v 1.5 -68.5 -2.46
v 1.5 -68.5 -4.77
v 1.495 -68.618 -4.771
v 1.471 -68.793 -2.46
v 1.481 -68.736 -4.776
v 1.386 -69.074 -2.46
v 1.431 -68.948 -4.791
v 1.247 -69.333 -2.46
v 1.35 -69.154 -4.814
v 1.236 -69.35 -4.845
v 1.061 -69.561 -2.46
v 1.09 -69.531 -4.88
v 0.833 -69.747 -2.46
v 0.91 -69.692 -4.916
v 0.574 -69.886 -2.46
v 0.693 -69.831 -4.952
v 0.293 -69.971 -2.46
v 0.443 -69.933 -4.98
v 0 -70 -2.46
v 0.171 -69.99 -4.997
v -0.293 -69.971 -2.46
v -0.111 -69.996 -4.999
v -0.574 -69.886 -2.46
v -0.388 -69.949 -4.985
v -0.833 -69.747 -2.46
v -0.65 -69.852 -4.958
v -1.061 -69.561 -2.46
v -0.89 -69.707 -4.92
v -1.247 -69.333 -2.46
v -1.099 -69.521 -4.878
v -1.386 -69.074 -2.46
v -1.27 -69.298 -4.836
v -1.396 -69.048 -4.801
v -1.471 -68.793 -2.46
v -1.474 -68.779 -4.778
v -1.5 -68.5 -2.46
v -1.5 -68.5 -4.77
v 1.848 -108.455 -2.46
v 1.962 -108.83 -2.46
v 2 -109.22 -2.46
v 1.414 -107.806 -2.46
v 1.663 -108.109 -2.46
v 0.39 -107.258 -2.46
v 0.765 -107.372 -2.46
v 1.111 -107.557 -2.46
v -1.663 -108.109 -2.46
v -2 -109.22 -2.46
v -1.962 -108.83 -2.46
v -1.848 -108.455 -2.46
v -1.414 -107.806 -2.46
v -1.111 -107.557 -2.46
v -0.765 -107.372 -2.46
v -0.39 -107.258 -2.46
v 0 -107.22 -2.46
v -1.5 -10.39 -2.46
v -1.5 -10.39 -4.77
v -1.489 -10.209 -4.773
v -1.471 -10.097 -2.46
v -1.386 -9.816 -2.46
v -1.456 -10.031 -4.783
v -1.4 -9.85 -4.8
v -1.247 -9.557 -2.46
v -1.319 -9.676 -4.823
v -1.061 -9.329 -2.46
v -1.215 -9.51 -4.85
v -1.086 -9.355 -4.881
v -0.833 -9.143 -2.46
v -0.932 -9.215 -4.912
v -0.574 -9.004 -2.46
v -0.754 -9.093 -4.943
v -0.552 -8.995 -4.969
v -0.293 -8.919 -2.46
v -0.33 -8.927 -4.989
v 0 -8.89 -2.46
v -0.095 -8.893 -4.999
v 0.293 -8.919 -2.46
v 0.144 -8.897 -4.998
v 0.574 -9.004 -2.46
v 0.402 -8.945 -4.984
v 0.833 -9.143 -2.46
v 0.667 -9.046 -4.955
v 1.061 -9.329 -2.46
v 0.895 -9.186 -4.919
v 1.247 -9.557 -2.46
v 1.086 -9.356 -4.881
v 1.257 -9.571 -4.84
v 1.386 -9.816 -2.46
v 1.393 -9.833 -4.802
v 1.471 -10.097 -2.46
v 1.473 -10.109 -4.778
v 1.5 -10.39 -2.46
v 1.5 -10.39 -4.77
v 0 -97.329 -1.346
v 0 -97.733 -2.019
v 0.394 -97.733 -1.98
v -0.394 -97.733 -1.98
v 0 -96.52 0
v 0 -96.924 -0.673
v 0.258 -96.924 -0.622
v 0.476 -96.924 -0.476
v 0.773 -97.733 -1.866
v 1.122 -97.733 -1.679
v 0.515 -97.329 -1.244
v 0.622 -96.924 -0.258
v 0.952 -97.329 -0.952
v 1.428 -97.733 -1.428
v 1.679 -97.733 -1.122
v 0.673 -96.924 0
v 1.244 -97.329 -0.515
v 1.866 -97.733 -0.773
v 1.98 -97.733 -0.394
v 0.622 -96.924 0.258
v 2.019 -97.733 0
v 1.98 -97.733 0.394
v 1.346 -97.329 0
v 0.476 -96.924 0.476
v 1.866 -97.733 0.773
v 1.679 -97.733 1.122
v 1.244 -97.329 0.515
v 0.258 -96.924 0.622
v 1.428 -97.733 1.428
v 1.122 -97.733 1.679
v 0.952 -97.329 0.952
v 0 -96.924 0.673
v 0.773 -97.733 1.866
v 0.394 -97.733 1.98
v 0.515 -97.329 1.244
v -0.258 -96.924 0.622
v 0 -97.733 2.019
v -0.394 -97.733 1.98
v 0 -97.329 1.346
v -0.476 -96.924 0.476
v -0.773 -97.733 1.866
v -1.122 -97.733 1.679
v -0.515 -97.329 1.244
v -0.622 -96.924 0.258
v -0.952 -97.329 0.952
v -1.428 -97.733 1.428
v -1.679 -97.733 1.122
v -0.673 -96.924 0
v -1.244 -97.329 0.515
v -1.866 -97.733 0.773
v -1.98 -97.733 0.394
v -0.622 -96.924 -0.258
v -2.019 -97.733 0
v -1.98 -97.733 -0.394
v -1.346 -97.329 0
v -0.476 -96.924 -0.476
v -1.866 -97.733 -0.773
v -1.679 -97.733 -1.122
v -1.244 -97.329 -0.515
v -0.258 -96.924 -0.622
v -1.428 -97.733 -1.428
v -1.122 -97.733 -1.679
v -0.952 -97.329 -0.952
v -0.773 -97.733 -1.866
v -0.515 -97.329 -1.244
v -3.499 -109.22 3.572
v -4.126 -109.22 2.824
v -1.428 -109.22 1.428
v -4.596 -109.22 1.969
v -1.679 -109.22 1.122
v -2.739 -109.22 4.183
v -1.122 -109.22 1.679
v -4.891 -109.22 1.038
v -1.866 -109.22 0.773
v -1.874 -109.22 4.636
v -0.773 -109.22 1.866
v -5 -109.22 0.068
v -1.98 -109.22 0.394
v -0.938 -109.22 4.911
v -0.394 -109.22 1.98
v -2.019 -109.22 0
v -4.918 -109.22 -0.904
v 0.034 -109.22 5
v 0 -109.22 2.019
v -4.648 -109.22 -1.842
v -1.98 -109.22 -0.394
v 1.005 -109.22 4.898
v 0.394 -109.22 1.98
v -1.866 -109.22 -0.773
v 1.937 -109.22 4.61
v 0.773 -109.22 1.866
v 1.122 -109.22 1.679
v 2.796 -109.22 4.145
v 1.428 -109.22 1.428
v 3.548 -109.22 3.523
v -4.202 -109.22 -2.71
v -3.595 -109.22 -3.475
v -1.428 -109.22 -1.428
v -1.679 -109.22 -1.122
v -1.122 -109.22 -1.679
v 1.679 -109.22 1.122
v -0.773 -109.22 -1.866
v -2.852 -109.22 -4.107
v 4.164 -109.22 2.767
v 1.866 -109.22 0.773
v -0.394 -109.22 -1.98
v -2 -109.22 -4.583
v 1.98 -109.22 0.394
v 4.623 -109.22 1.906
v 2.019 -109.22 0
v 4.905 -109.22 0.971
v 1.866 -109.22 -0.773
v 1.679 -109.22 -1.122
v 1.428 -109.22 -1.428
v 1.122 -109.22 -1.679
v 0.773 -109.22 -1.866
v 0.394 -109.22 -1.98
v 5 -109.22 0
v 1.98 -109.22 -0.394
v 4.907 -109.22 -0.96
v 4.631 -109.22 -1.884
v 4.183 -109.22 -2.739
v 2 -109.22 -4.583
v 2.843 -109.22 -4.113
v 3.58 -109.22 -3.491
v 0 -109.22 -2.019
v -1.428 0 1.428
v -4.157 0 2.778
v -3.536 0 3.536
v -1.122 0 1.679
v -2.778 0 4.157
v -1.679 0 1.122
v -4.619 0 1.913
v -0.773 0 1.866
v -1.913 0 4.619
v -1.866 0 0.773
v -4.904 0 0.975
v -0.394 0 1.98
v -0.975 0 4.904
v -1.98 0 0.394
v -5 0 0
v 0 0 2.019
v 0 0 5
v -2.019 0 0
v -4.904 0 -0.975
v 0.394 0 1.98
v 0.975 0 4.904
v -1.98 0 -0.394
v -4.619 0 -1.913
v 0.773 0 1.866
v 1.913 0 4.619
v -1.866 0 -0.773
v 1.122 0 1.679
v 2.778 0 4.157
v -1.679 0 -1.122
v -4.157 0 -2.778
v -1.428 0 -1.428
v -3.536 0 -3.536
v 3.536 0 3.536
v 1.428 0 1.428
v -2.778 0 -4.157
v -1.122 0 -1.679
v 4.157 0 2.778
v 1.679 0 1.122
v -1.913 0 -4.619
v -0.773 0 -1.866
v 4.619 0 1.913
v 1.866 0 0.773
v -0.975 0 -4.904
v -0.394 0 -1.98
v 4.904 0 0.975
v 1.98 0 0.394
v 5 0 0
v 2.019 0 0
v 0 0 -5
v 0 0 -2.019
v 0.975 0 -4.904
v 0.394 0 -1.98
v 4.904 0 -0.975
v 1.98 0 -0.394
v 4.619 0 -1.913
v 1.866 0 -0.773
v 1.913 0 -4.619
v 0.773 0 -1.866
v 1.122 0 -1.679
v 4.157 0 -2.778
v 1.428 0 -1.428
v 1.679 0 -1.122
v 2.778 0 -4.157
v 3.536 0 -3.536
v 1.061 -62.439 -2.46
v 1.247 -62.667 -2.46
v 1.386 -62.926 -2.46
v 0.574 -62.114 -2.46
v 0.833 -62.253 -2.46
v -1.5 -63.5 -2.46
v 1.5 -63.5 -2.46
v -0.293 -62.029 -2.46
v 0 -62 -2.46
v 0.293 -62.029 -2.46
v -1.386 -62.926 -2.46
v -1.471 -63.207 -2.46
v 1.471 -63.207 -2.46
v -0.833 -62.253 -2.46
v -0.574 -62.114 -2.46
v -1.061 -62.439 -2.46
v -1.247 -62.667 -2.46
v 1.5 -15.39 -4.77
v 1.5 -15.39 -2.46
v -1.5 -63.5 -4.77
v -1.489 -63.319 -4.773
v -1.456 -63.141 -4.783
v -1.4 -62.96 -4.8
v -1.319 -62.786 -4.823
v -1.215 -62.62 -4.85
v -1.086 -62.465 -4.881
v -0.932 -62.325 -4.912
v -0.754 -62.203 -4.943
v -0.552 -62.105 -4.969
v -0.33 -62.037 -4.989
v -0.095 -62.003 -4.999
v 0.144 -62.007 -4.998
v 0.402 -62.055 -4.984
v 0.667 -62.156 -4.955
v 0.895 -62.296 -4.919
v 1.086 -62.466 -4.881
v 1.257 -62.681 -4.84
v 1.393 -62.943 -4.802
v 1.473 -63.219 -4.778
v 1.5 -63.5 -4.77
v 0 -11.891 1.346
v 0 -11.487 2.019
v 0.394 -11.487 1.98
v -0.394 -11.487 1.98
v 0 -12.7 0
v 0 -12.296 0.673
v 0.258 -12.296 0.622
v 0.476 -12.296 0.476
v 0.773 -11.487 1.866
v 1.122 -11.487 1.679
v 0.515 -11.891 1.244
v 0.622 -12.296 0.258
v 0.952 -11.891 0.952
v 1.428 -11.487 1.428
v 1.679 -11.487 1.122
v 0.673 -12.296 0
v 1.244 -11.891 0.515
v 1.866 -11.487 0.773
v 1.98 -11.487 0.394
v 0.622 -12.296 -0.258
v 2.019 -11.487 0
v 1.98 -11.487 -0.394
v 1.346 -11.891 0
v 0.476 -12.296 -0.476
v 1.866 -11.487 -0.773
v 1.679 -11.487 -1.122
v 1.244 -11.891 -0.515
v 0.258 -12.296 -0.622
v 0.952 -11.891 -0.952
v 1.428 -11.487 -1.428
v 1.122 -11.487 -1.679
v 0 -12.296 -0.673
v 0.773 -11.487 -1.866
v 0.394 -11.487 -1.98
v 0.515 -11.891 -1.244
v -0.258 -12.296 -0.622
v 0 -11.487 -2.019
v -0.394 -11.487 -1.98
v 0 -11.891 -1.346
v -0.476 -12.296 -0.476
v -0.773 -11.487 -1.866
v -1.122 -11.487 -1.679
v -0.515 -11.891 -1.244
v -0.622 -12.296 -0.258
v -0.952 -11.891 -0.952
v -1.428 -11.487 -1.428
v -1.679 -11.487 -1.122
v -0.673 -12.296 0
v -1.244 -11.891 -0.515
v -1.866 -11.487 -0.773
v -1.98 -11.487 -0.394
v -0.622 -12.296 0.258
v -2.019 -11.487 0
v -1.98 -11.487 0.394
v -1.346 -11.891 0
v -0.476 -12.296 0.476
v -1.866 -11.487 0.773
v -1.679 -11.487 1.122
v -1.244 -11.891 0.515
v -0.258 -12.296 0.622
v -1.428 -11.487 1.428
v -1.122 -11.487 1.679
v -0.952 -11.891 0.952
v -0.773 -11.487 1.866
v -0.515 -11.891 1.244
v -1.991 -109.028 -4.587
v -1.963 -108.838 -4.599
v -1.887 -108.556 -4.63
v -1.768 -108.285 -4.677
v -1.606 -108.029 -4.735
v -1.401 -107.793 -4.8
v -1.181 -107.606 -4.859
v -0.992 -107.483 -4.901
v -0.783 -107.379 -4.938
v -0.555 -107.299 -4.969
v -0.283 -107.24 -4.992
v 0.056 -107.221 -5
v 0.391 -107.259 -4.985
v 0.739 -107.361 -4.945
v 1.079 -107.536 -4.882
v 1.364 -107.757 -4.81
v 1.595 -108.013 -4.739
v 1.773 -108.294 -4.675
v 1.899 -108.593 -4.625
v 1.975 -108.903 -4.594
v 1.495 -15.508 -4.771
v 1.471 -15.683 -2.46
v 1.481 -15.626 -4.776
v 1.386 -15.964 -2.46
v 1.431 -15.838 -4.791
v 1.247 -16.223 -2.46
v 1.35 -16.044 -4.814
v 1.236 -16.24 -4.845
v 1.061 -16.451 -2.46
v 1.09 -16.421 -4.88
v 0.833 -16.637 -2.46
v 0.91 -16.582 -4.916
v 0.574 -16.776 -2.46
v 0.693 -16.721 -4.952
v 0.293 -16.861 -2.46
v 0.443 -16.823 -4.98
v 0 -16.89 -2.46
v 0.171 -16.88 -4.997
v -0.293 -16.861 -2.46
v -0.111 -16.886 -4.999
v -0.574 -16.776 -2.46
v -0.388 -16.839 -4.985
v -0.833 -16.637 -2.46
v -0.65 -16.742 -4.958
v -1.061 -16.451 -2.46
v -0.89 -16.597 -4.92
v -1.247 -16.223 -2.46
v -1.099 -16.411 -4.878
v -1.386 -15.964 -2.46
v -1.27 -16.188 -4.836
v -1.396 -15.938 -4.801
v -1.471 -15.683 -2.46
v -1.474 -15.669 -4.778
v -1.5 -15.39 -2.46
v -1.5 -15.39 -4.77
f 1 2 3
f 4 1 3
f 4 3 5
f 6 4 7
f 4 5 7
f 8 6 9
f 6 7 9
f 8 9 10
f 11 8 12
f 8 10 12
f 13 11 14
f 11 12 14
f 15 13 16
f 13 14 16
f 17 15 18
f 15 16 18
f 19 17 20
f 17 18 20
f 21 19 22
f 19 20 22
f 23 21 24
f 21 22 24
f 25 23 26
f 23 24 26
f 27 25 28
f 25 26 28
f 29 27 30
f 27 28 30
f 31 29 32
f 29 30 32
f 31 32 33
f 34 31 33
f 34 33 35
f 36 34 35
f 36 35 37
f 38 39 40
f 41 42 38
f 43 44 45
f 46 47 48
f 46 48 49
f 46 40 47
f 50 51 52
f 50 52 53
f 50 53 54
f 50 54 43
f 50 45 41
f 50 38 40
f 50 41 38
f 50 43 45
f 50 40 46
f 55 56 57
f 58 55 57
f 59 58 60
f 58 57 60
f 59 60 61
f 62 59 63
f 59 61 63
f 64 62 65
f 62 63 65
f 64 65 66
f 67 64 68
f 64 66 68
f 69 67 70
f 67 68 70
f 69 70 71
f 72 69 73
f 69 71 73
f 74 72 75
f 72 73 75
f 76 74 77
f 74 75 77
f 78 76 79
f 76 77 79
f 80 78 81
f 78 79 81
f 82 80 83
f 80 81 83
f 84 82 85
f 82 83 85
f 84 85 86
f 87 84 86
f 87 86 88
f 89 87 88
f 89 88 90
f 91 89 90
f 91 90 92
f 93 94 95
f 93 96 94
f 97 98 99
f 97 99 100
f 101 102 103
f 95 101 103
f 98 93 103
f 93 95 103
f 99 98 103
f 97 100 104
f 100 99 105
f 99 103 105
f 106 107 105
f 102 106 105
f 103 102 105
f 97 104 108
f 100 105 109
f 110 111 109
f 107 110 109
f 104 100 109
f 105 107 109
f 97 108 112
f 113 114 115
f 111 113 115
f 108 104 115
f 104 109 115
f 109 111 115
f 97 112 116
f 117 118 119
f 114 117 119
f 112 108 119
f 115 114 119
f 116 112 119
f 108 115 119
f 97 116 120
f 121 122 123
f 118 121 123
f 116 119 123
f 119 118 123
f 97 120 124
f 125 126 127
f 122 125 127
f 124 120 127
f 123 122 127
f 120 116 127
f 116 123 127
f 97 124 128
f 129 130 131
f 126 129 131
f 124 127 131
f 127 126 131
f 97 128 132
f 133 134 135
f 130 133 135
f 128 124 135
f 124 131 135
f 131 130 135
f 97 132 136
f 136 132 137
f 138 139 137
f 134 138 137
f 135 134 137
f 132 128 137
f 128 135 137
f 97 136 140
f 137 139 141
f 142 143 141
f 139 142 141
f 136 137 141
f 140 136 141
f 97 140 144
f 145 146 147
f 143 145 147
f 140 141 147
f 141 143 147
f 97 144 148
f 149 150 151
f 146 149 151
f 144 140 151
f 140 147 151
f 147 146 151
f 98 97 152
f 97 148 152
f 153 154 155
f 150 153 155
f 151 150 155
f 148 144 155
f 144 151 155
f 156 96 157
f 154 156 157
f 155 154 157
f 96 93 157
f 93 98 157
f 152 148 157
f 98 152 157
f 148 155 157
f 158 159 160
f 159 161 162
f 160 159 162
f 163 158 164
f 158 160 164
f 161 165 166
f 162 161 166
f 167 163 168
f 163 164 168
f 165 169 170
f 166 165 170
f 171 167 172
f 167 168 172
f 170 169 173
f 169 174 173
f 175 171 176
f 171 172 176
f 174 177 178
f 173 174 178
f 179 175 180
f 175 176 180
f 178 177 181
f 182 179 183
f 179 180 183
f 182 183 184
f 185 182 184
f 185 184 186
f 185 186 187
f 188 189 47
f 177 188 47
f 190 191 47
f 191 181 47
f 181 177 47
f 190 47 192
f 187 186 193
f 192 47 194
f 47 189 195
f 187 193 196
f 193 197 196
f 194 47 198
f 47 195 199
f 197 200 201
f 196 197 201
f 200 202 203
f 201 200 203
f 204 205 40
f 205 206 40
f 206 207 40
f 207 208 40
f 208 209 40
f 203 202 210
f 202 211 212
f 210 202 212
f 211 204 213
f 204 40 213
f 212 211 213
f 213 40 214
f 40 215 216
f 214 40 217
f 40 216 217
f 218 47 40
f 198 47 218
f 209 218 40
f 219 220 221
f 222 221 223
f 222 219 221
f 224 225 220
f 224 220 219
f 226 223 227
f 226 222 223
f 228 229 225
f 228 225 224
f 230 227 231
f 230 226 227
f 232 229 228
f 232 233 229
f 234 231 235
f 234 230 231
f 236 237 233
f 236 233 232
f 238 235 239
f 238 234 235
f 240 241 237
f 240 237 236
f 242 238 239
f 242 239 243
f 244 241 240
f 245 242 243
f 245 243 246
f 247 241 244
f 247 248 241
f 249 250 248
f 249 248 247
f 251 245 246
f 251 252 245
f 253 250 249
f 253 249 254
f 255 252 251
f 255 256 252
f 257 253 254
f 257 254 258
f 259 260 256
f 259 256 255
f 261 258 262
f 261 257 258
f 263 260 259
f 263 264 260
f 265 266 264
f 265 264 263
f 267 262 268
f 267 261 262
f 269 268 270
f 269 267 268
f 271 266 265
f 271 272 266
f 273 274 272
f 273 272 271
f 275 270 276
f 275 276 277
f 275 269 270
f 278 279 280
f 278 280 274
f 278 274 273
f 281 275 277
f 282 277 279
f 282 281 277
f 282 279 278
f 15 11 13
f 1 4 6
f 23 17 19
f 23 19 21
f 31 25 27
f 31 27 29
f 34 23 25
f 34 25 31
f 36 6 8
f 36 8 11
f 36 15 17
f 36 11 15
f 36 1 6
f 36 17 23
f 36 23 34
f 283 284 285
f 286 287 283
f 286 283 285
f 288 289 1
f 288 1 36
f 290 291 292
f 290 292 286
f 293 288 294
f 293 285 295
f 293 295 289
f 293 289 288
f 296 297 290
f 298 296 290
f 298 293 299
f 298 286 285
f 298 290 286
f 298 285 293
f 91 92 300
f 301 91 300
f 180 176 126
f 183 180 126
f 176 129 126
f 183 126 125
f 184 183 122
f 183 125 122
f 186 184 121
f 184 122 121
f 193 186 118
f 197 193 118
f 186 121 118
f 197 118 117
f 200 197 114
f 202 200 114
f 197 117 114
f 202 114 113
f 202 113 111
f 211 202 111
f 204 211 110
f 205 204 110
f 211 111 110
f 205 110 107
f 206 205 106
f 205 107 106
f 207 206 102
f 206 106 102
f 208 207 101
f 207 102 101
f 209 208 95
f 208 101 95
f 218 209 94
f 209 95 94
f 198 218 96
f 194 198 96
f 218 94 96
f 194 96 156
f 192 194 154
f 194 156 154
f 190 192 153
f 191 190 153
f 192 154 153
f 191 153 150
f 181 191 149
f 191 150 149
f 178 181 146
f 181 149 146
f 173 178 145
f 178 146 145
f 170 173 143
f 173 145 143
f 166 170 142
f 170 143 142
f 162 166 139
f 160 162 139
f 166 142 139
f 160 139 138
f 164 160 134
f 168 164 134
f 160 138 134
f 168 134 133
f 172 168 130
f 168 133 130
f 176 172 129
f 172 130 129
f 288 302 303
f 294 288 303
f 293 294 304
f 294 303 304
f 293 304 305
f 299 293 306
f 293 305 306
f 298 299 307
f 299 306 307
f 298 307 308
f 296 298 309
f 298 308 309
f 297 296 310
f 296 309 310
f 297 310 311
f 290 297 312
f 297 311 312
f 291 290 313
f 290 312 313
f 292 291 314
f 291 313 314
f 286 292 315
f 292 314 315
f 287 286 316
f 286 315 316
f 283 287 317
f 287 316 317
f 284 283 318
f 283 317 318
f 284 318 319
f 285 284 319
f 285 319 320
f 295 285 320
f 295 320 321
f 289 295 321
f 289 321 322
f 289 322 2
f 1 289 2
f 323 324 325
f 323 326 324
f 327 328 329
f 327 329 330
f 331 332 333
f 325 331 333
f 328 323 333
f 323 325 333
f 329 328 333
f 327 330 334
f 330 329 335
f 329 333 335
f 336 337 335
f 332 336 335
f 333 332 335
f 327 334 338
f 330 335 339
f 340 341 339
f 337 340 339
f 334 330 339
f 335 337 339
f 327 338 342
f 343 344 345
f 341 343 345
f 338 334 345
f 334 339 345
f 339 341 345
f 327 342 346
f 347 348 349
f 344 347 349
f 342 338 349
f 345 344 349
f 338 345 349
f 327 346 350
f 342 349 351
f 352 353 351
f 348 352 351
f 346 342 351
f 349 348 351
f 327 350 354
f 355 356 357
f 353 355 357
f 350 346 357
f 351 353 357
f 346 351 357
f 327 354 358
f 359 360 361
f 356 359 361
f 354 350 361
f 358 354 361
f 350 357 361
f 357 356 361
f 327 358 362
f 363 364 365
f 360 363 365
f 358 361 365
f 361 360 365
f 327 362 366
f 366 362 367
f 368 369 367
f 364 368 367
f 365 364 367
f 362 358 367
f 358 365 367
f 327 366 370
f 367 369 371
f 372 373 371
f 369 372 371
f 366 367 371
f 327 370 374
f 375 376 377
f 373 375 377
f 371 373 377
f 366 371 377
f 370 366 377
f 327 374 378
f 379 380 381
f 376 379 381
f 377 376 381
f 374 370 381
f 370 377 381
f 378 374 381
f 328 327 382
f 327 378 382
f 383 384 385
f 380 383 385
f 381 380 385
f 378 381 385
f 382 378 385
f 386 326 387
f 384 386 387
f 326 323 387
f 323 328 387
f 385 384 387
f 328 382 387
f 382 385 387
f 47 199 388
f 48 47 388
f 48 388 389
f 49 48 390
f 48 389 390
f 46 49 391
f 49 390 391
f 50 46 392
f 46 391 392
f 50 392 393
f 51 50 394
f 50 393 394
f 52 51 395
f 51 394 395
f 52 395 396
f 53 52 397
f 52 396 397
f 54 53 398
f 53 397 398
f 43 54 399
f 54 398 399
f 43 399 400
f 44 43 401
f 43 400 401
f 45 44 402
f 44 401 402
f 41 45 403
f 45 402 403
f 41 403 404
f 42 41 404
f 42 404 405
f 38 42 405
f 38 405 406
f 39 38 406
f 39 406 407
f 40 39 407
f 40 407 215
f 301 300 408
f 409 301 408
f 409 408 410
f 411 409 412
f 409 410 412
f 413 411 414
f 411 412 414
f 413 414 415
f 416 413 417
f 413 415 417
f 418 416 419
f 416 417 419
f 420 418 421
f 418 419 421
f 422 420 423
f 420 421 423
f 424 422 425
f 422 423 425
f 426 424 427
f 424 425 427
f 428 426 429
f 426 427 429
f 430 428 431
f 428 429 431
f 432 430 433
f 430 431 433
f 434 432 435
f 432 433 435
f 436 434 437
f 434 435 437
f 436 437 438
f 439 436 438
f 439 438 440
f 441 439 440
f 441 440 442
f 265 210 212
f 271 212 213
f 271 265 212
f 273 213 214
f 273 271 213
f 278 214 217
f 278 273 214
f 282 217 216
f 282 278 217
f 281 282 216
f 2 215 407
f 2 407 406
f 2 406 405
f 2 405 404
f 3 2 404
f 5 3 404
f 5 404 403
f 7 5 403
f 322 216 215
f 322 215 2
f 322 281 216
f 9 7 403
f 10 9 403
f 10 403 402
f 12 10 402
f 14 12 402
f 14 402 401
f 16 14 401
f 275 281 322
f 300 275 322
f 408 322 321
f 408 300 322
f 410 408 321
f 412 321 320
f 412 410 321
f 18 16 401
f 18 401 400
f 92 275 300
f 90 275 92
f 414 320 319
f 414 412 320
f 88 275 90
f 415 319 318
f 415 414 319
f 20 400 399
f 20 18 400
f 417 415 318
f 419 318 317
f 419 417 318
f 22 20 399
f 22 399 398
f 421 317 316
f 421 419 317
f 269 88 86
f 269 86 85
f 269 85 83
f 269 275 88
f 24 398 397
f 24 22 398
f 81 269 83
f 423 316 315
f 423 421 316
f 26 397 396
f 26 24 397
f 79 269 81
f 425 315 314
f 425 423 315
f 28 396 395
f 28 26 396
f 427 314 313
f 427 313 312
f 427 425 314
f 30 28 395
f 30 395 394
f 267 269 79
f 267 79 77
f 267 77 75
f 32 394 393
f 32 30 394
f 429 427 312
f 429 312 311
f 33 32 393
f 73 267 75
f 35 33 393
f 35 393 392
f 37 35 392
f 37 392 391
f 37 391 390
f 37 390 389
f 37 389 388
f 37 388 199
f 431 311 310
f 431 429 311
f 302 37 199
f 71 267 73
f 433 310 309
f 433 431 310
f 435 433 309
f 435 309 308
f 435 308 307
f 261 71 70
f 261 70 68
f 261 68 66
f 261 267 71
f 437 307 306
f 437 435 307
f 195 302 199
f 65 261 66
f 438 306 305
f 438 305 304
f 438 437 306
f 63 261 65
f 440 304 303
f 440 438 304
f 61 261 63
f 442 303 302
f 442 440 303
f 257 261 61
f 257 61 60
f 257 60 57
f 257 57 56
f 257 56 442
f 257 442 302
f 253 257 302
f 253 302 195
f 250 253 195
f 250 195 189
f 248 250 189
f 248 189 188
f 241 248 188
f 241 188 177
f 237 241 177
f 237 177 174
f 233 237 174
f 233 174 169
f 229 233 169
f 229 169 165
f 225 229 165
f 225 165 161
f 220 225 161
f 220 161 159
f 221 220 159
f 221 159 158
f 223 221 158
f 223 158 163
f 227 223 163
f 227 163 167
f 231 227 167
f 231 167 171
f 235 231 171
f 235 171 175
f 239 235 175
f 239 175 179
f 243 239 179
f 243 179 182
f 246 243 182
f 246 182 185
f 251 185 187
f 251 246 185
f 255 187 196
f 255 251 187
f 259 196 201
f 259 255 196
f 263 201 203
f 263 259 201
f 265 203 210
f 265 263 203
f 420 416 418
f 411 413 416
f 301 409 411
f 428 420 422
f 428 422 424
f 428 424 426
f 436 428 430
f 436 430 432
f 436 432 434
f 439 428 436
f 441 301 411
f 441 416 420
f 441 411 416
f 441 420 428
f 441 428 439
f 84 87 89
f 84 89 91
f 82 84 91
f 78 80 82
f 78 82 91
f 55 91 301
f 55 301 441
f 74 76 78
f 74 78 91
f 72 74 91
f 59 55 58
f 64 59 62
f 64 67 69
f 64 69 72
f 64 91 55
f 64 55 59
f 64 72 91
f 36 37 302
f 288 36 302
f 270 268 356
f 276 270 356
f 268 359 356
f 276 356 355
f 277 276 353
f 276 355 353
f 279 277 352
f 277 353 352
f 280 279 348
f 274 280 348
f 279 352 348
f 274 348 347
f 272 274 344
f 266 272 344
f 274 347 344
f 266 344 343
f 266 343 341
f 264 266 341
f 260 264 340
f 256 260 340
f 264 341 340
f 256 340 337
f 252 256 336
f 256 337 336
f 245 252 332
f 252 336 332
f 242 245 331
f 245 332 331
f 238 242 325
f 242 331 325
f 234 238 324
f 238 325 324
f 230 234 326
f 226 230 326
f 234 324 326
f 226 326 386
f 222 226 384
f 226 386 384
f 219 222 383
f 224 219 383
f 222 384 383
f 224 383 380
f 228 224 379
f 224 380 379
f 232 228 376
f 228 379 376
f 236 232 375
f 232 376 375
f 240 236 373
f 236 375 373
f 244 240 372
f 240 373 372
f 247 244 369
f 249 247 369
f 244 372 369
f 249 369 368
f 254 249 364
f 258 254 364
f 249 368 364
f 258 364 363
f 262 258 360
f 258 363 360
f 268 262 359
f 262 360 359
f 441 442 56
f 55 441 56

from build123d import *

# Parameters (mm, degrees)
SKETCH1_R                                = 5
BOSS_EXTRUDE2_DEPTH                      = 109.22
CUT_EXTRUDE1_DEPTH                       = 2.54
TAP_DRILL_FOR_10_32_TAP1_D               = 4.0386
TAP_DRILL_FOR_10_32_TAP1_DEPTH           = 11.486682152
TAP_DRILL_FOR_10_32_TAP1_TIP             = 1.213317848
TAP_DRILL_FOR_10_32_TAP1_ON_FACE_2_D     = 4.0386
TAP_DRILL_FOR_10_32_TAP1_ON_FACE_2_DEPTH = 11.486682152
TAP_DRILL_FOR_10_32_TAP1_ON_FACE_2_TIP   = 1.213317848


with BuildPart() as part:
    # Sketch1 → Boss-Extrude2 (new body)
    with BuildSketch(Plane(origin=(0, 0, 0), x_dir=(1, 0, 0), z_dir=(0, 1, 0))):
        Circle(SKETCH1_R)
    extrude(amount=-BOSS_EXTRUDE2_DEPTH)

    # Sketch2 → Cut-Extrude1 (cut)
    with BuildSketch(Plane(origin=(0, 0, -5), x_dir=(-1, 0, 0), z_dir=(0, 0, -1))):
        with BuildLine():
            Line((-2, -109.22), (-2, -114.22))
            ThreePointArc((-2, -114.22), (0, -116.22), (2, -114.22))
            Line((2, -114.22), (2, -109.22))
            ThreePointArc((2, -109.22), (0, -107.22), (-2, -109.22))
        make_face()
        with BuildLine():
            Line((-1.5, -63.5), (-1.5, -68.5))
            ThreePointArc((-1.5, -68.5), (0, -70), (1.5, -68.5))
            Line((1.5, -68.5), (1.5, -63.5))
            ThreePointArc((1.5, -63.5), (0, -62), (-1.5, -63.5))
        make_face()
        with BuildLine():
            Line((-1.5, -10.39), (-1.5, -15.39))
            ThreePointArc((-1.5, -15.39), (0, -16.89), (1.5, -15.39))
            Line((1.5, -15.39), (1.5, -10.39))
            ThreePointArc((1.5, -10.39), (0, -8.89), (-1.5, -10.39))
        make_face()
    extrude(amount=-CUT_EXTRUDE1_DEPTH, mode=Mode.SUBTRACT)

    # Tap Drill for #10-32 Tap1
    with Locations(Plane.ZX):
        with Locations((0, 0)):
            Hole(TAP_DRILL_FOR_10_32_TAP1_D / 2, depth=TAP_DRILL_FOR_10_32_TAP1_DEPTH)
            with Locations((0, 0, -(TAP_DRILL_FOR_10_32_TAP1_DEPTH + TAP_DRILL_FOR_10_32_TAP1_TIP / 2))):  # 118° drill point
                Cone(0, TAP_DRILL_FOR_10_32_TAP1_D / 2, TAP_DRILL_FOR_10_32_TAP1_TIP, mode=Mode.SUBTRACT)

    # Tap Drill for #10-32 Tap1 on face 2
    with Locations(Plane(origin=(0, -109.22, 0), x_dir=(0, 0, -1), z_dir=(0, -1, 0))):
        with Locations((0, 0)):
            Hole(TAP_DRILL_FOR_10_32_TAP1_ON_FACE_2_D / 2, depth=TAP_DRILL_FOR_10_32_TAP1_ON_FACE_2_DEPTH)
            with Locations((0, 0, -(TAP_DRILL_FOR_10_32_TAP1_ON_FACE_2_DEPTH + TAP_DRILL_FOR_10_32_TAP1_ON_FACE_2_TIP / 2))):  # 118° drill point
                Cone(0, TAP_DRILL_FOR_10_32_TAP1_ON_FACE_2_D / 2, TAP_DRILL_FOR_10_32_TAP1_ON_FACE_2_TIP, mode=Mode.SUBTRACT)


solid = part.part
